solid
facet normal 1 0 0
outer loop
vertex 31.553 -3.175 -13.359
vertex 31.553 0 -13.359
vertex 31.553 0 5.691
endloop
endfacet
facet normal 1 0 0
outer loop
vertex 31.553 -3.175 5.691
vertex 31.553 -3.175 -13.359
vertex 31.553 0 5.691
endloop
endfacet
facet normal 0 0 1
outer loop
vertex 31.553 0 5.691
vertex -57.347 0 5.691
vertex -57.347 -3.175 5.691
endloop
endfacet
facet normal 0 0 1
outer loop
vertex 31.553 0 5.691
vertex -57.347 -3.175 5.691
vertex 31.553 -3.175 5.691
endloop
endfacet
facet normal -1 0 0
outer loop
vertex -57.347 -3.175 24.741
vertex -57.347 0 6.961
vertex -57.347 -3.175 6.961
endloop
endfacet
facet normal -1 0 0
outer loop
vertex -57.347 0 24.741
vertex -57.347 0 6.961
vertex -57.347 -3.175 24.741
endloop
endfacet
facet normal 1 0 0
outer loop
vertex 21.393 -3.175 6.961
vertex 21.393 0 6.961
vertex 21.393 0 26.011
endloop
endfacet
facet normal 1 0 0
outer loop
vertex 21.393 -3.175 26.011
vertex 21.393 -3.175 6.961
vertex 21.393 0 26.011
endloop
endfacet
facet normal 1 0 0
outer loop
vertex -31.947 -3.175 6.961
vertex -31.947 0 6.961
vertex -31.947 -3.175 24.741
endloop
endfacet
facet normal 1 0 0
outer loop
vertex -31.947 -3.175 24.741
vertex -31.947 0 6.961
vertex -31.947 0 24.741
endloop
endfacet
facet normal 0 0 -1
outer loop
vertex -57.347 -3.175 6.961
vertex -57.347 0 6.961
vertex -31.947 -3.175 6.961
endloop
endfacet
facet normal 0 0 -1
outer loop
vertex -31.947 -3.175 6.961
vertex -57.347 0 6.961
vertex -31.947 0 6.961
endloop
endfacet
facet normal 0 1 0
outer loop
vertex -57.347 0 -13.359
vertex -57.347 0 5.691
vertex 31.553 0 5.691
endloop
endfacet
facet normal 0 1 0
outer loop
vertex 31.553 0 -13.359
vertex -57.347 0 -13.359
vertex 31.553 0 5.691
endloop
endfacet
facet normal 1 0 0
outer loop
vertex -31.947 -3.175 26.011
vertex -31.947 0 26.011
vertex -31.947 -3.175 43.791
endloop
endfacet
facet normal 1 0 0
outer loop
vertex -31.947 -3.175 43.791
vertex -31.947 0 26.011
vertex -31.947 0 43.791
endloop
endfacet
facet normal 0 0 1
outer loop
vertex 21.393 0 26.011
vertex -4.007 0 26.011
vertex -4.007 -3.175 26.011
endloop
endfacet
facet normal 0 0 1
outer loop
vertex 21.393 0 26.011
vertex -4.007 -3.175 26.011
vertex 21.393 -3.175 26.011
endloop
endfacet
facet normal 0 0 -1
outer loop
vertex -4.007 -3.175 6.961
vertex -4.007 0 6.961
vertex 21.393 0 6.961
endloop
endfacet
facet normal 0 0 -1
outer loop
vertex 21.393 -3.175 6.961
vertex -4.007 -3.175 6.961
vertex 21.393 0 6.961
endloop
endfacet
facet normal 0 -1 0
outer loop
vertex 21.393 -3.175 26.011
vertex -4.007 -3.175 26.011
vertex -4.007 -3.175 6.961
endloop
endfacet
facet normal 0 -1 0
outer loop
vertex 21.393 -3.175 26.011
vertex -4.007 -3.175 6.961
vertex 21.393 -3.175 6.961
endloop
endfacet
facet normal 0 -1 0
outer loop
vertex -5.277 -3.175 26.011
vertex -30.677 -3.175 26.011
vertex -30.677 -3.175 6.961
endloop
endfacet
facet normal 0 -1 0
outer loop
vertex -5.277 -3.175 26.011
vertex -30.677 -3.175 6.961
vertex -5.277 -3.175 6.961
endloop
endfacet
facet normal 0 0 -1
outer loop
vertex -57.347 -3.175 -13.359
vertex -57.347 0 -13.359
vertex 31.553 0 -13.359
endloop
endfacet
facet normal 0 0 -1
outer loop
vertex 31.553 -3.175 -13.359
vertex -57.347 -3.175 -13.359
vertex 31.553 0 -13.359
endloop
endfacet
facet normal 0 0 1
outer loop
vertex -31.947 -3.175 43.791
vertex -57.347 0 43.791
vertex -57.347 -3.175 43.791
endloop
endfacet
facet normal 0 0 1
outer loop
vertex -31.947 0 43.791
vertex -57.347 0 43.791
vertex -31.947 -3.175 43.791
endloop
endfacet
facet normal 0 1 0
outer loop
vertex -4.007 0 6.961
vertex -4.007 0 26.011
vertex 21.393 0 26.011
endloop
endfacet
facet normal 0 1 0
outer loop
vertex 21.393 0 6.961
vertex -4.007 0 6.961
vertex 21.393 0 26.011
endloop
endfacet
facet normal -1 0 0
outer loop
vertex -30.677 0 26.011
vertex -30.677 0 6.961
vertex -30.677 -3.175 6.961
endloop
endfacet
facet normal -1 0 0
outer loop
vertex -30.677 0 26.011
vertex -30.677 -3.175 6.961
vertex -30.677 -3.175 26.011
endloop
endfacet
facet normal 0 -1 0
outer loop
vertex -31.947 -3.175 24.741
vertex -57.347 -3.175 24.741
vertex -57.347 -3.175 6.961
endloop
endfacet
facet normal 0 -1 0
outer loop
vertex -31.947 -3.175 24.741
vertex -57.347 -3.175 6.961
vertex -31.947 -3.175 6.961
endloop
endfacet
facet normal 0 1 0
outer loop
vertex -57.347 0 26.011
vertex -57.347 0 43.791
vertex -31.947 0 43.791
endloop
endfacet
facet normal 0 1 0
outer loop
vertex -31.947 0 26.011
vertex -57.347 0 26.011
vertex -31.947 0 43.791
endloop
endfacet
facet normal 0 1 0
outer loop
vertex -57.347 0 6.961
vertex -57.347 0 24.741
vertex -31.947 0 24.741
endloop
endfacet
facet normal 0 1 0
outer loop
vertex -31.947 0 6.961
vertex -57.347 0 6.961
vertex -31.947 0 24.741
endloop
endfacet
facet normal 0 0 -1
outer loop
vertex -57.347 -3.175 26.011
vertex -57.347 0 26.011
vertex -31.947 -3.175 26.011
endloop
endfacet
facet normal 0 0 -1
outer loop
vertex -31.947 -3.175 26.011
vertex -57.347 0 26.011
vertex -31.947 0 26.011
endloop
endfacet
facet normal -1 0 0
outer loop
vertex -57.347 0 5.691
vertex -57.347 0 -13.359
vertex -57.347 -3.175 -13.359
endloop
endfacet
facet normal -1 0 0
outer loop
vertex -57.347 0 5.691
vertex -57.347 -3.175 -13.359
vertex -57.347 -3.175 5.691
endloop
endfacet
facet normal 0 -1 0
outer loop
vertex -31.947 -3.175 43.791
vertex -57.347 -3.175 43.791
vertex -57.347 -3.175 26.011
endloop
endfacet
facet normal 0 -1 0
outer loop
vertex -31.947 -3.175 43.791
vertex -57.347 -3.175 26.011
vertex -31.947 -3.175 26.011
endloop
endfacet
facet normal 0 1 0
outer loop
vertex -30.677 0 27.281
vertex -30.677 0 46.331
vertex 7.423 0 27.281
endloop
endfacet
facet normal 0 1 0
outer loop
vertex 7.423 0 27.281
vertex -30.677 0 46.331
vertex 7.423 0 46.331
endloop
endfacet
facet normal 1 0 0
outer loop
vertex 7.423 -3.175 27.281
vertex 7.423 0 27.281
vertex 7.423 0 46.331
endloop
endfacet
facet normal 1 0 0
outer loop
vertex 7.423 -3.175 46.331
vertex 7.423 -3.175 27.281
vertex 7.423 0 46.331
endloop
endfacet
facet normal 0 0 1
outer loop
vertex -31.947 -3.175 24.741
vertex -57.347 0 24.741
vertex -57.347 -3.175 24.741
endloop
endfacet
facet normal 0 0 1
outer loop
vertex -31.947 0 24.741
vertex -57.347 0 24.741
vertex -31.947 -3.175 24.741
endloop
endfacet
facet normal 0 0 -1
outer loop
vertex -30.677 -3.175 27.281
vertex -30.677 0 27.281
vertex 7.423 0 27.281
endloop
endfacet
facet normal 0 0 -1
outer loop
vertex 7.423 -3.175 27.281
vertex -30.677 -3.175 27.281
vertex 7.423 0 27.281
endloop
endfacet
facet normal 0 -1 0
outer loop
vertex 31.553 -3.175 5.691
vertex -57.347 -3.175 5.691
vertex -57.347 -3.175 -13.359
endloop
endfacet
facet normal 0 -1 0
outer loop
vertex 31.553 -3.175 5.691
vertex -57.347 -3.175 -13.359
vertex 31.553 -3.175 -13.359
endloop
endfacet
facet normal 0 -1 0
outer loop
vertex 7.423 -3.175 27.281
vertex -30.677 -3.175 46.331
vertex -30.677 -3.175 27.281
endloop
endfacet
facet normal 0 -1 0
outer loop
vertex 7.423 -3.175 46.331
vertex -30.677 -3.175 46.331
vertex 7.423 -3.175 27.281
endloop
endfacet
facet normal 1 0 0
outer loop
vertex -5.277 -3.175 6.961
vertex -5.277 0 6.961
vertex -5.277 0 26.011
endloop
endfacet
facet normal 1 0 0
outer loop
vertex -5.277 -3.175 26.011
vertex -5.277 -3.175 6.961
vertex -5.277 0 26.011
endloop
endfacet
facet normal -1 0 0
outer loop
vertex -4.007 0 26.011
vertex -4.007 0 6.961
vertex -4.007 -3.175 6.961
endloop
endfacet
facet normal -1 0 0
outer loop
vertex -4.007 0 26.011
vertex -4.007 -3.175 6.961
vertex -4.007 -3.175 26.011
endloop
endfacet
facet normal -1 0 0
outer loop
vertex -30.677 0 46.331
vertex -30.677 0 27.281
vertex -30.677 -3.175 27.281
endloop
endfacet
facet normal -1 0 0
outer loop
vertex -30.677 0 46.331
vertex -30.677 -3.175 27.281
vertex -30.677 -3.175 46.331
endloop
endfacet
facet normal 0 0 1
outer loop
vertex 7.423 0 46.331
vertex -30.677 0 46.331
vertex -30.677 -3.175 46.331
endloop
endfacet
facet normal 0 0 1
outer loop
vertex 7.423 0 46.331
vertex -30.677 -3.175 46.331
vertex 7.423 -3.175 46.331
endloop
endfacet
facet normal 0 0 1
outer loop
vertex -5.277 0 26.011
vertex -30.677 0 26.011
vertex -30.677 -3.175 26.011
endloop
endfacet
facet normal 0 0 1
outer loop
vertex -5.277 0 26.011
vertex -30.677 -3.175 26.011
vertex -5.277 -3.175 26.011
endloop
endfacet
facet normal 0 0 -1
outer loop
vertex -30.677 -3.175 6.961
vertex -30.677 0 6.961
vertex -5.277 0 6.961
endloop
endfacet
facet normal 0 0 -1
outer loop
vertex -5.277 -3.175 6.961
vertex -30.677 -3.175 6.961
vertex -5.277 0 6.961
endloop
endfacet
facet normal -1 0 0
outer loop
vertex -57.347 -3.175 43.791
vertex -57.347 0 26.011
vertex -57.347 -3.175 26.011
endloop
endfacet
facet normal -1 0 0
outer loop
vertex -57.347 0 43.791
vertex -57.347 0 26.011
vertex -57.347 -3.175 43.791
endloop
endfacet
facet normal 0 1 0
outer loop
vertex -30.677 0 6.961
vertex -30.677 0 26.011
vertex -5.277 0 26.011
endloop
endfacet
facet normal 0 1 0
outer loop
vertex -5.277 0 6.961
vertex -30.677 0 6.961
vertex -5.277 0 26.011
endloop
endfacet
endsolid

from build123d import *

# Parameters (mm, degrees)
F0_W     = 25.4
F0_H     = 17.78
F1_DEPTH = 3.175
F0_W_2   = 38.1
F0_H_2   = 19.05
F0_W_3   = 88.9


# Not quite as in the source:
# - a length typed as a fraction of an inch, garbled in the dataset ("3 / 203.2 mm" for 3/8 in), is restored


with BuildPart() as f1:
    # F0 (on Front) → F1 (new body)
    with BuildSketch(Plane.XZ):
        with Locations((-44.6465671939, 34.900879418)):
            Rectangle(F0_W, F0_H)
    extrude(amount=F1_DEPTH)


with BuildPart() as f1b:
    # F0 (on Front) → F1, piece 2 (new body)
    with BuildSketch(Plane.XZ):
        with Locations((-11.6265671939, 36.805879418)):
            Rectangle(F0_W_2, F0_H_2)
    extrude(amount=F1_DEPTH)


with BuildPart() as f1c:
    # F0 (on Front) → F1, piece 3 (new body)
    with BuildSketch(Plane.XZ):
        with Locations((-17.9765671939, 16.485879418)):
            Rectangle(F0_W, F0_H_2)
    extrude(amount=F1_DEPTH)


with BuildPart() as f1d:
    # F0 (on Front) → F1, piece 4 (new body)
    with BuildSketch(Plane.XZ):
        with Locations((-44.6465671939, 15.850879418)):
            Rectangle(F0_W, F0_H)
    extrude(amount=F1_DEPTH)


with BuildPart() as f1e:
    # F0 (on Front) → F1, piece 5 (new body)
    with BuildSketch(Plane.XZ):
        with Locations((-12.8965671939, -3.834120582)):
            Rectangle(F0_W_3, F0_H_2)
    extrude(amount=F1_DEPTH)


with BuildPart() as f1f:
    # F0 (on Front) → F1, piece 6 (new body)
    with BuildSketch(Plane.XZ):
        with Locations((8.6934328061, 16.485879418)):
            Rectangle(F0_W, F0_H_2)
    extrude(amount=F1_DEPTH)


solid = Compound([f1.part, f1b.part, f1c.part, f1d.part, f1e.part, f1f.part])
